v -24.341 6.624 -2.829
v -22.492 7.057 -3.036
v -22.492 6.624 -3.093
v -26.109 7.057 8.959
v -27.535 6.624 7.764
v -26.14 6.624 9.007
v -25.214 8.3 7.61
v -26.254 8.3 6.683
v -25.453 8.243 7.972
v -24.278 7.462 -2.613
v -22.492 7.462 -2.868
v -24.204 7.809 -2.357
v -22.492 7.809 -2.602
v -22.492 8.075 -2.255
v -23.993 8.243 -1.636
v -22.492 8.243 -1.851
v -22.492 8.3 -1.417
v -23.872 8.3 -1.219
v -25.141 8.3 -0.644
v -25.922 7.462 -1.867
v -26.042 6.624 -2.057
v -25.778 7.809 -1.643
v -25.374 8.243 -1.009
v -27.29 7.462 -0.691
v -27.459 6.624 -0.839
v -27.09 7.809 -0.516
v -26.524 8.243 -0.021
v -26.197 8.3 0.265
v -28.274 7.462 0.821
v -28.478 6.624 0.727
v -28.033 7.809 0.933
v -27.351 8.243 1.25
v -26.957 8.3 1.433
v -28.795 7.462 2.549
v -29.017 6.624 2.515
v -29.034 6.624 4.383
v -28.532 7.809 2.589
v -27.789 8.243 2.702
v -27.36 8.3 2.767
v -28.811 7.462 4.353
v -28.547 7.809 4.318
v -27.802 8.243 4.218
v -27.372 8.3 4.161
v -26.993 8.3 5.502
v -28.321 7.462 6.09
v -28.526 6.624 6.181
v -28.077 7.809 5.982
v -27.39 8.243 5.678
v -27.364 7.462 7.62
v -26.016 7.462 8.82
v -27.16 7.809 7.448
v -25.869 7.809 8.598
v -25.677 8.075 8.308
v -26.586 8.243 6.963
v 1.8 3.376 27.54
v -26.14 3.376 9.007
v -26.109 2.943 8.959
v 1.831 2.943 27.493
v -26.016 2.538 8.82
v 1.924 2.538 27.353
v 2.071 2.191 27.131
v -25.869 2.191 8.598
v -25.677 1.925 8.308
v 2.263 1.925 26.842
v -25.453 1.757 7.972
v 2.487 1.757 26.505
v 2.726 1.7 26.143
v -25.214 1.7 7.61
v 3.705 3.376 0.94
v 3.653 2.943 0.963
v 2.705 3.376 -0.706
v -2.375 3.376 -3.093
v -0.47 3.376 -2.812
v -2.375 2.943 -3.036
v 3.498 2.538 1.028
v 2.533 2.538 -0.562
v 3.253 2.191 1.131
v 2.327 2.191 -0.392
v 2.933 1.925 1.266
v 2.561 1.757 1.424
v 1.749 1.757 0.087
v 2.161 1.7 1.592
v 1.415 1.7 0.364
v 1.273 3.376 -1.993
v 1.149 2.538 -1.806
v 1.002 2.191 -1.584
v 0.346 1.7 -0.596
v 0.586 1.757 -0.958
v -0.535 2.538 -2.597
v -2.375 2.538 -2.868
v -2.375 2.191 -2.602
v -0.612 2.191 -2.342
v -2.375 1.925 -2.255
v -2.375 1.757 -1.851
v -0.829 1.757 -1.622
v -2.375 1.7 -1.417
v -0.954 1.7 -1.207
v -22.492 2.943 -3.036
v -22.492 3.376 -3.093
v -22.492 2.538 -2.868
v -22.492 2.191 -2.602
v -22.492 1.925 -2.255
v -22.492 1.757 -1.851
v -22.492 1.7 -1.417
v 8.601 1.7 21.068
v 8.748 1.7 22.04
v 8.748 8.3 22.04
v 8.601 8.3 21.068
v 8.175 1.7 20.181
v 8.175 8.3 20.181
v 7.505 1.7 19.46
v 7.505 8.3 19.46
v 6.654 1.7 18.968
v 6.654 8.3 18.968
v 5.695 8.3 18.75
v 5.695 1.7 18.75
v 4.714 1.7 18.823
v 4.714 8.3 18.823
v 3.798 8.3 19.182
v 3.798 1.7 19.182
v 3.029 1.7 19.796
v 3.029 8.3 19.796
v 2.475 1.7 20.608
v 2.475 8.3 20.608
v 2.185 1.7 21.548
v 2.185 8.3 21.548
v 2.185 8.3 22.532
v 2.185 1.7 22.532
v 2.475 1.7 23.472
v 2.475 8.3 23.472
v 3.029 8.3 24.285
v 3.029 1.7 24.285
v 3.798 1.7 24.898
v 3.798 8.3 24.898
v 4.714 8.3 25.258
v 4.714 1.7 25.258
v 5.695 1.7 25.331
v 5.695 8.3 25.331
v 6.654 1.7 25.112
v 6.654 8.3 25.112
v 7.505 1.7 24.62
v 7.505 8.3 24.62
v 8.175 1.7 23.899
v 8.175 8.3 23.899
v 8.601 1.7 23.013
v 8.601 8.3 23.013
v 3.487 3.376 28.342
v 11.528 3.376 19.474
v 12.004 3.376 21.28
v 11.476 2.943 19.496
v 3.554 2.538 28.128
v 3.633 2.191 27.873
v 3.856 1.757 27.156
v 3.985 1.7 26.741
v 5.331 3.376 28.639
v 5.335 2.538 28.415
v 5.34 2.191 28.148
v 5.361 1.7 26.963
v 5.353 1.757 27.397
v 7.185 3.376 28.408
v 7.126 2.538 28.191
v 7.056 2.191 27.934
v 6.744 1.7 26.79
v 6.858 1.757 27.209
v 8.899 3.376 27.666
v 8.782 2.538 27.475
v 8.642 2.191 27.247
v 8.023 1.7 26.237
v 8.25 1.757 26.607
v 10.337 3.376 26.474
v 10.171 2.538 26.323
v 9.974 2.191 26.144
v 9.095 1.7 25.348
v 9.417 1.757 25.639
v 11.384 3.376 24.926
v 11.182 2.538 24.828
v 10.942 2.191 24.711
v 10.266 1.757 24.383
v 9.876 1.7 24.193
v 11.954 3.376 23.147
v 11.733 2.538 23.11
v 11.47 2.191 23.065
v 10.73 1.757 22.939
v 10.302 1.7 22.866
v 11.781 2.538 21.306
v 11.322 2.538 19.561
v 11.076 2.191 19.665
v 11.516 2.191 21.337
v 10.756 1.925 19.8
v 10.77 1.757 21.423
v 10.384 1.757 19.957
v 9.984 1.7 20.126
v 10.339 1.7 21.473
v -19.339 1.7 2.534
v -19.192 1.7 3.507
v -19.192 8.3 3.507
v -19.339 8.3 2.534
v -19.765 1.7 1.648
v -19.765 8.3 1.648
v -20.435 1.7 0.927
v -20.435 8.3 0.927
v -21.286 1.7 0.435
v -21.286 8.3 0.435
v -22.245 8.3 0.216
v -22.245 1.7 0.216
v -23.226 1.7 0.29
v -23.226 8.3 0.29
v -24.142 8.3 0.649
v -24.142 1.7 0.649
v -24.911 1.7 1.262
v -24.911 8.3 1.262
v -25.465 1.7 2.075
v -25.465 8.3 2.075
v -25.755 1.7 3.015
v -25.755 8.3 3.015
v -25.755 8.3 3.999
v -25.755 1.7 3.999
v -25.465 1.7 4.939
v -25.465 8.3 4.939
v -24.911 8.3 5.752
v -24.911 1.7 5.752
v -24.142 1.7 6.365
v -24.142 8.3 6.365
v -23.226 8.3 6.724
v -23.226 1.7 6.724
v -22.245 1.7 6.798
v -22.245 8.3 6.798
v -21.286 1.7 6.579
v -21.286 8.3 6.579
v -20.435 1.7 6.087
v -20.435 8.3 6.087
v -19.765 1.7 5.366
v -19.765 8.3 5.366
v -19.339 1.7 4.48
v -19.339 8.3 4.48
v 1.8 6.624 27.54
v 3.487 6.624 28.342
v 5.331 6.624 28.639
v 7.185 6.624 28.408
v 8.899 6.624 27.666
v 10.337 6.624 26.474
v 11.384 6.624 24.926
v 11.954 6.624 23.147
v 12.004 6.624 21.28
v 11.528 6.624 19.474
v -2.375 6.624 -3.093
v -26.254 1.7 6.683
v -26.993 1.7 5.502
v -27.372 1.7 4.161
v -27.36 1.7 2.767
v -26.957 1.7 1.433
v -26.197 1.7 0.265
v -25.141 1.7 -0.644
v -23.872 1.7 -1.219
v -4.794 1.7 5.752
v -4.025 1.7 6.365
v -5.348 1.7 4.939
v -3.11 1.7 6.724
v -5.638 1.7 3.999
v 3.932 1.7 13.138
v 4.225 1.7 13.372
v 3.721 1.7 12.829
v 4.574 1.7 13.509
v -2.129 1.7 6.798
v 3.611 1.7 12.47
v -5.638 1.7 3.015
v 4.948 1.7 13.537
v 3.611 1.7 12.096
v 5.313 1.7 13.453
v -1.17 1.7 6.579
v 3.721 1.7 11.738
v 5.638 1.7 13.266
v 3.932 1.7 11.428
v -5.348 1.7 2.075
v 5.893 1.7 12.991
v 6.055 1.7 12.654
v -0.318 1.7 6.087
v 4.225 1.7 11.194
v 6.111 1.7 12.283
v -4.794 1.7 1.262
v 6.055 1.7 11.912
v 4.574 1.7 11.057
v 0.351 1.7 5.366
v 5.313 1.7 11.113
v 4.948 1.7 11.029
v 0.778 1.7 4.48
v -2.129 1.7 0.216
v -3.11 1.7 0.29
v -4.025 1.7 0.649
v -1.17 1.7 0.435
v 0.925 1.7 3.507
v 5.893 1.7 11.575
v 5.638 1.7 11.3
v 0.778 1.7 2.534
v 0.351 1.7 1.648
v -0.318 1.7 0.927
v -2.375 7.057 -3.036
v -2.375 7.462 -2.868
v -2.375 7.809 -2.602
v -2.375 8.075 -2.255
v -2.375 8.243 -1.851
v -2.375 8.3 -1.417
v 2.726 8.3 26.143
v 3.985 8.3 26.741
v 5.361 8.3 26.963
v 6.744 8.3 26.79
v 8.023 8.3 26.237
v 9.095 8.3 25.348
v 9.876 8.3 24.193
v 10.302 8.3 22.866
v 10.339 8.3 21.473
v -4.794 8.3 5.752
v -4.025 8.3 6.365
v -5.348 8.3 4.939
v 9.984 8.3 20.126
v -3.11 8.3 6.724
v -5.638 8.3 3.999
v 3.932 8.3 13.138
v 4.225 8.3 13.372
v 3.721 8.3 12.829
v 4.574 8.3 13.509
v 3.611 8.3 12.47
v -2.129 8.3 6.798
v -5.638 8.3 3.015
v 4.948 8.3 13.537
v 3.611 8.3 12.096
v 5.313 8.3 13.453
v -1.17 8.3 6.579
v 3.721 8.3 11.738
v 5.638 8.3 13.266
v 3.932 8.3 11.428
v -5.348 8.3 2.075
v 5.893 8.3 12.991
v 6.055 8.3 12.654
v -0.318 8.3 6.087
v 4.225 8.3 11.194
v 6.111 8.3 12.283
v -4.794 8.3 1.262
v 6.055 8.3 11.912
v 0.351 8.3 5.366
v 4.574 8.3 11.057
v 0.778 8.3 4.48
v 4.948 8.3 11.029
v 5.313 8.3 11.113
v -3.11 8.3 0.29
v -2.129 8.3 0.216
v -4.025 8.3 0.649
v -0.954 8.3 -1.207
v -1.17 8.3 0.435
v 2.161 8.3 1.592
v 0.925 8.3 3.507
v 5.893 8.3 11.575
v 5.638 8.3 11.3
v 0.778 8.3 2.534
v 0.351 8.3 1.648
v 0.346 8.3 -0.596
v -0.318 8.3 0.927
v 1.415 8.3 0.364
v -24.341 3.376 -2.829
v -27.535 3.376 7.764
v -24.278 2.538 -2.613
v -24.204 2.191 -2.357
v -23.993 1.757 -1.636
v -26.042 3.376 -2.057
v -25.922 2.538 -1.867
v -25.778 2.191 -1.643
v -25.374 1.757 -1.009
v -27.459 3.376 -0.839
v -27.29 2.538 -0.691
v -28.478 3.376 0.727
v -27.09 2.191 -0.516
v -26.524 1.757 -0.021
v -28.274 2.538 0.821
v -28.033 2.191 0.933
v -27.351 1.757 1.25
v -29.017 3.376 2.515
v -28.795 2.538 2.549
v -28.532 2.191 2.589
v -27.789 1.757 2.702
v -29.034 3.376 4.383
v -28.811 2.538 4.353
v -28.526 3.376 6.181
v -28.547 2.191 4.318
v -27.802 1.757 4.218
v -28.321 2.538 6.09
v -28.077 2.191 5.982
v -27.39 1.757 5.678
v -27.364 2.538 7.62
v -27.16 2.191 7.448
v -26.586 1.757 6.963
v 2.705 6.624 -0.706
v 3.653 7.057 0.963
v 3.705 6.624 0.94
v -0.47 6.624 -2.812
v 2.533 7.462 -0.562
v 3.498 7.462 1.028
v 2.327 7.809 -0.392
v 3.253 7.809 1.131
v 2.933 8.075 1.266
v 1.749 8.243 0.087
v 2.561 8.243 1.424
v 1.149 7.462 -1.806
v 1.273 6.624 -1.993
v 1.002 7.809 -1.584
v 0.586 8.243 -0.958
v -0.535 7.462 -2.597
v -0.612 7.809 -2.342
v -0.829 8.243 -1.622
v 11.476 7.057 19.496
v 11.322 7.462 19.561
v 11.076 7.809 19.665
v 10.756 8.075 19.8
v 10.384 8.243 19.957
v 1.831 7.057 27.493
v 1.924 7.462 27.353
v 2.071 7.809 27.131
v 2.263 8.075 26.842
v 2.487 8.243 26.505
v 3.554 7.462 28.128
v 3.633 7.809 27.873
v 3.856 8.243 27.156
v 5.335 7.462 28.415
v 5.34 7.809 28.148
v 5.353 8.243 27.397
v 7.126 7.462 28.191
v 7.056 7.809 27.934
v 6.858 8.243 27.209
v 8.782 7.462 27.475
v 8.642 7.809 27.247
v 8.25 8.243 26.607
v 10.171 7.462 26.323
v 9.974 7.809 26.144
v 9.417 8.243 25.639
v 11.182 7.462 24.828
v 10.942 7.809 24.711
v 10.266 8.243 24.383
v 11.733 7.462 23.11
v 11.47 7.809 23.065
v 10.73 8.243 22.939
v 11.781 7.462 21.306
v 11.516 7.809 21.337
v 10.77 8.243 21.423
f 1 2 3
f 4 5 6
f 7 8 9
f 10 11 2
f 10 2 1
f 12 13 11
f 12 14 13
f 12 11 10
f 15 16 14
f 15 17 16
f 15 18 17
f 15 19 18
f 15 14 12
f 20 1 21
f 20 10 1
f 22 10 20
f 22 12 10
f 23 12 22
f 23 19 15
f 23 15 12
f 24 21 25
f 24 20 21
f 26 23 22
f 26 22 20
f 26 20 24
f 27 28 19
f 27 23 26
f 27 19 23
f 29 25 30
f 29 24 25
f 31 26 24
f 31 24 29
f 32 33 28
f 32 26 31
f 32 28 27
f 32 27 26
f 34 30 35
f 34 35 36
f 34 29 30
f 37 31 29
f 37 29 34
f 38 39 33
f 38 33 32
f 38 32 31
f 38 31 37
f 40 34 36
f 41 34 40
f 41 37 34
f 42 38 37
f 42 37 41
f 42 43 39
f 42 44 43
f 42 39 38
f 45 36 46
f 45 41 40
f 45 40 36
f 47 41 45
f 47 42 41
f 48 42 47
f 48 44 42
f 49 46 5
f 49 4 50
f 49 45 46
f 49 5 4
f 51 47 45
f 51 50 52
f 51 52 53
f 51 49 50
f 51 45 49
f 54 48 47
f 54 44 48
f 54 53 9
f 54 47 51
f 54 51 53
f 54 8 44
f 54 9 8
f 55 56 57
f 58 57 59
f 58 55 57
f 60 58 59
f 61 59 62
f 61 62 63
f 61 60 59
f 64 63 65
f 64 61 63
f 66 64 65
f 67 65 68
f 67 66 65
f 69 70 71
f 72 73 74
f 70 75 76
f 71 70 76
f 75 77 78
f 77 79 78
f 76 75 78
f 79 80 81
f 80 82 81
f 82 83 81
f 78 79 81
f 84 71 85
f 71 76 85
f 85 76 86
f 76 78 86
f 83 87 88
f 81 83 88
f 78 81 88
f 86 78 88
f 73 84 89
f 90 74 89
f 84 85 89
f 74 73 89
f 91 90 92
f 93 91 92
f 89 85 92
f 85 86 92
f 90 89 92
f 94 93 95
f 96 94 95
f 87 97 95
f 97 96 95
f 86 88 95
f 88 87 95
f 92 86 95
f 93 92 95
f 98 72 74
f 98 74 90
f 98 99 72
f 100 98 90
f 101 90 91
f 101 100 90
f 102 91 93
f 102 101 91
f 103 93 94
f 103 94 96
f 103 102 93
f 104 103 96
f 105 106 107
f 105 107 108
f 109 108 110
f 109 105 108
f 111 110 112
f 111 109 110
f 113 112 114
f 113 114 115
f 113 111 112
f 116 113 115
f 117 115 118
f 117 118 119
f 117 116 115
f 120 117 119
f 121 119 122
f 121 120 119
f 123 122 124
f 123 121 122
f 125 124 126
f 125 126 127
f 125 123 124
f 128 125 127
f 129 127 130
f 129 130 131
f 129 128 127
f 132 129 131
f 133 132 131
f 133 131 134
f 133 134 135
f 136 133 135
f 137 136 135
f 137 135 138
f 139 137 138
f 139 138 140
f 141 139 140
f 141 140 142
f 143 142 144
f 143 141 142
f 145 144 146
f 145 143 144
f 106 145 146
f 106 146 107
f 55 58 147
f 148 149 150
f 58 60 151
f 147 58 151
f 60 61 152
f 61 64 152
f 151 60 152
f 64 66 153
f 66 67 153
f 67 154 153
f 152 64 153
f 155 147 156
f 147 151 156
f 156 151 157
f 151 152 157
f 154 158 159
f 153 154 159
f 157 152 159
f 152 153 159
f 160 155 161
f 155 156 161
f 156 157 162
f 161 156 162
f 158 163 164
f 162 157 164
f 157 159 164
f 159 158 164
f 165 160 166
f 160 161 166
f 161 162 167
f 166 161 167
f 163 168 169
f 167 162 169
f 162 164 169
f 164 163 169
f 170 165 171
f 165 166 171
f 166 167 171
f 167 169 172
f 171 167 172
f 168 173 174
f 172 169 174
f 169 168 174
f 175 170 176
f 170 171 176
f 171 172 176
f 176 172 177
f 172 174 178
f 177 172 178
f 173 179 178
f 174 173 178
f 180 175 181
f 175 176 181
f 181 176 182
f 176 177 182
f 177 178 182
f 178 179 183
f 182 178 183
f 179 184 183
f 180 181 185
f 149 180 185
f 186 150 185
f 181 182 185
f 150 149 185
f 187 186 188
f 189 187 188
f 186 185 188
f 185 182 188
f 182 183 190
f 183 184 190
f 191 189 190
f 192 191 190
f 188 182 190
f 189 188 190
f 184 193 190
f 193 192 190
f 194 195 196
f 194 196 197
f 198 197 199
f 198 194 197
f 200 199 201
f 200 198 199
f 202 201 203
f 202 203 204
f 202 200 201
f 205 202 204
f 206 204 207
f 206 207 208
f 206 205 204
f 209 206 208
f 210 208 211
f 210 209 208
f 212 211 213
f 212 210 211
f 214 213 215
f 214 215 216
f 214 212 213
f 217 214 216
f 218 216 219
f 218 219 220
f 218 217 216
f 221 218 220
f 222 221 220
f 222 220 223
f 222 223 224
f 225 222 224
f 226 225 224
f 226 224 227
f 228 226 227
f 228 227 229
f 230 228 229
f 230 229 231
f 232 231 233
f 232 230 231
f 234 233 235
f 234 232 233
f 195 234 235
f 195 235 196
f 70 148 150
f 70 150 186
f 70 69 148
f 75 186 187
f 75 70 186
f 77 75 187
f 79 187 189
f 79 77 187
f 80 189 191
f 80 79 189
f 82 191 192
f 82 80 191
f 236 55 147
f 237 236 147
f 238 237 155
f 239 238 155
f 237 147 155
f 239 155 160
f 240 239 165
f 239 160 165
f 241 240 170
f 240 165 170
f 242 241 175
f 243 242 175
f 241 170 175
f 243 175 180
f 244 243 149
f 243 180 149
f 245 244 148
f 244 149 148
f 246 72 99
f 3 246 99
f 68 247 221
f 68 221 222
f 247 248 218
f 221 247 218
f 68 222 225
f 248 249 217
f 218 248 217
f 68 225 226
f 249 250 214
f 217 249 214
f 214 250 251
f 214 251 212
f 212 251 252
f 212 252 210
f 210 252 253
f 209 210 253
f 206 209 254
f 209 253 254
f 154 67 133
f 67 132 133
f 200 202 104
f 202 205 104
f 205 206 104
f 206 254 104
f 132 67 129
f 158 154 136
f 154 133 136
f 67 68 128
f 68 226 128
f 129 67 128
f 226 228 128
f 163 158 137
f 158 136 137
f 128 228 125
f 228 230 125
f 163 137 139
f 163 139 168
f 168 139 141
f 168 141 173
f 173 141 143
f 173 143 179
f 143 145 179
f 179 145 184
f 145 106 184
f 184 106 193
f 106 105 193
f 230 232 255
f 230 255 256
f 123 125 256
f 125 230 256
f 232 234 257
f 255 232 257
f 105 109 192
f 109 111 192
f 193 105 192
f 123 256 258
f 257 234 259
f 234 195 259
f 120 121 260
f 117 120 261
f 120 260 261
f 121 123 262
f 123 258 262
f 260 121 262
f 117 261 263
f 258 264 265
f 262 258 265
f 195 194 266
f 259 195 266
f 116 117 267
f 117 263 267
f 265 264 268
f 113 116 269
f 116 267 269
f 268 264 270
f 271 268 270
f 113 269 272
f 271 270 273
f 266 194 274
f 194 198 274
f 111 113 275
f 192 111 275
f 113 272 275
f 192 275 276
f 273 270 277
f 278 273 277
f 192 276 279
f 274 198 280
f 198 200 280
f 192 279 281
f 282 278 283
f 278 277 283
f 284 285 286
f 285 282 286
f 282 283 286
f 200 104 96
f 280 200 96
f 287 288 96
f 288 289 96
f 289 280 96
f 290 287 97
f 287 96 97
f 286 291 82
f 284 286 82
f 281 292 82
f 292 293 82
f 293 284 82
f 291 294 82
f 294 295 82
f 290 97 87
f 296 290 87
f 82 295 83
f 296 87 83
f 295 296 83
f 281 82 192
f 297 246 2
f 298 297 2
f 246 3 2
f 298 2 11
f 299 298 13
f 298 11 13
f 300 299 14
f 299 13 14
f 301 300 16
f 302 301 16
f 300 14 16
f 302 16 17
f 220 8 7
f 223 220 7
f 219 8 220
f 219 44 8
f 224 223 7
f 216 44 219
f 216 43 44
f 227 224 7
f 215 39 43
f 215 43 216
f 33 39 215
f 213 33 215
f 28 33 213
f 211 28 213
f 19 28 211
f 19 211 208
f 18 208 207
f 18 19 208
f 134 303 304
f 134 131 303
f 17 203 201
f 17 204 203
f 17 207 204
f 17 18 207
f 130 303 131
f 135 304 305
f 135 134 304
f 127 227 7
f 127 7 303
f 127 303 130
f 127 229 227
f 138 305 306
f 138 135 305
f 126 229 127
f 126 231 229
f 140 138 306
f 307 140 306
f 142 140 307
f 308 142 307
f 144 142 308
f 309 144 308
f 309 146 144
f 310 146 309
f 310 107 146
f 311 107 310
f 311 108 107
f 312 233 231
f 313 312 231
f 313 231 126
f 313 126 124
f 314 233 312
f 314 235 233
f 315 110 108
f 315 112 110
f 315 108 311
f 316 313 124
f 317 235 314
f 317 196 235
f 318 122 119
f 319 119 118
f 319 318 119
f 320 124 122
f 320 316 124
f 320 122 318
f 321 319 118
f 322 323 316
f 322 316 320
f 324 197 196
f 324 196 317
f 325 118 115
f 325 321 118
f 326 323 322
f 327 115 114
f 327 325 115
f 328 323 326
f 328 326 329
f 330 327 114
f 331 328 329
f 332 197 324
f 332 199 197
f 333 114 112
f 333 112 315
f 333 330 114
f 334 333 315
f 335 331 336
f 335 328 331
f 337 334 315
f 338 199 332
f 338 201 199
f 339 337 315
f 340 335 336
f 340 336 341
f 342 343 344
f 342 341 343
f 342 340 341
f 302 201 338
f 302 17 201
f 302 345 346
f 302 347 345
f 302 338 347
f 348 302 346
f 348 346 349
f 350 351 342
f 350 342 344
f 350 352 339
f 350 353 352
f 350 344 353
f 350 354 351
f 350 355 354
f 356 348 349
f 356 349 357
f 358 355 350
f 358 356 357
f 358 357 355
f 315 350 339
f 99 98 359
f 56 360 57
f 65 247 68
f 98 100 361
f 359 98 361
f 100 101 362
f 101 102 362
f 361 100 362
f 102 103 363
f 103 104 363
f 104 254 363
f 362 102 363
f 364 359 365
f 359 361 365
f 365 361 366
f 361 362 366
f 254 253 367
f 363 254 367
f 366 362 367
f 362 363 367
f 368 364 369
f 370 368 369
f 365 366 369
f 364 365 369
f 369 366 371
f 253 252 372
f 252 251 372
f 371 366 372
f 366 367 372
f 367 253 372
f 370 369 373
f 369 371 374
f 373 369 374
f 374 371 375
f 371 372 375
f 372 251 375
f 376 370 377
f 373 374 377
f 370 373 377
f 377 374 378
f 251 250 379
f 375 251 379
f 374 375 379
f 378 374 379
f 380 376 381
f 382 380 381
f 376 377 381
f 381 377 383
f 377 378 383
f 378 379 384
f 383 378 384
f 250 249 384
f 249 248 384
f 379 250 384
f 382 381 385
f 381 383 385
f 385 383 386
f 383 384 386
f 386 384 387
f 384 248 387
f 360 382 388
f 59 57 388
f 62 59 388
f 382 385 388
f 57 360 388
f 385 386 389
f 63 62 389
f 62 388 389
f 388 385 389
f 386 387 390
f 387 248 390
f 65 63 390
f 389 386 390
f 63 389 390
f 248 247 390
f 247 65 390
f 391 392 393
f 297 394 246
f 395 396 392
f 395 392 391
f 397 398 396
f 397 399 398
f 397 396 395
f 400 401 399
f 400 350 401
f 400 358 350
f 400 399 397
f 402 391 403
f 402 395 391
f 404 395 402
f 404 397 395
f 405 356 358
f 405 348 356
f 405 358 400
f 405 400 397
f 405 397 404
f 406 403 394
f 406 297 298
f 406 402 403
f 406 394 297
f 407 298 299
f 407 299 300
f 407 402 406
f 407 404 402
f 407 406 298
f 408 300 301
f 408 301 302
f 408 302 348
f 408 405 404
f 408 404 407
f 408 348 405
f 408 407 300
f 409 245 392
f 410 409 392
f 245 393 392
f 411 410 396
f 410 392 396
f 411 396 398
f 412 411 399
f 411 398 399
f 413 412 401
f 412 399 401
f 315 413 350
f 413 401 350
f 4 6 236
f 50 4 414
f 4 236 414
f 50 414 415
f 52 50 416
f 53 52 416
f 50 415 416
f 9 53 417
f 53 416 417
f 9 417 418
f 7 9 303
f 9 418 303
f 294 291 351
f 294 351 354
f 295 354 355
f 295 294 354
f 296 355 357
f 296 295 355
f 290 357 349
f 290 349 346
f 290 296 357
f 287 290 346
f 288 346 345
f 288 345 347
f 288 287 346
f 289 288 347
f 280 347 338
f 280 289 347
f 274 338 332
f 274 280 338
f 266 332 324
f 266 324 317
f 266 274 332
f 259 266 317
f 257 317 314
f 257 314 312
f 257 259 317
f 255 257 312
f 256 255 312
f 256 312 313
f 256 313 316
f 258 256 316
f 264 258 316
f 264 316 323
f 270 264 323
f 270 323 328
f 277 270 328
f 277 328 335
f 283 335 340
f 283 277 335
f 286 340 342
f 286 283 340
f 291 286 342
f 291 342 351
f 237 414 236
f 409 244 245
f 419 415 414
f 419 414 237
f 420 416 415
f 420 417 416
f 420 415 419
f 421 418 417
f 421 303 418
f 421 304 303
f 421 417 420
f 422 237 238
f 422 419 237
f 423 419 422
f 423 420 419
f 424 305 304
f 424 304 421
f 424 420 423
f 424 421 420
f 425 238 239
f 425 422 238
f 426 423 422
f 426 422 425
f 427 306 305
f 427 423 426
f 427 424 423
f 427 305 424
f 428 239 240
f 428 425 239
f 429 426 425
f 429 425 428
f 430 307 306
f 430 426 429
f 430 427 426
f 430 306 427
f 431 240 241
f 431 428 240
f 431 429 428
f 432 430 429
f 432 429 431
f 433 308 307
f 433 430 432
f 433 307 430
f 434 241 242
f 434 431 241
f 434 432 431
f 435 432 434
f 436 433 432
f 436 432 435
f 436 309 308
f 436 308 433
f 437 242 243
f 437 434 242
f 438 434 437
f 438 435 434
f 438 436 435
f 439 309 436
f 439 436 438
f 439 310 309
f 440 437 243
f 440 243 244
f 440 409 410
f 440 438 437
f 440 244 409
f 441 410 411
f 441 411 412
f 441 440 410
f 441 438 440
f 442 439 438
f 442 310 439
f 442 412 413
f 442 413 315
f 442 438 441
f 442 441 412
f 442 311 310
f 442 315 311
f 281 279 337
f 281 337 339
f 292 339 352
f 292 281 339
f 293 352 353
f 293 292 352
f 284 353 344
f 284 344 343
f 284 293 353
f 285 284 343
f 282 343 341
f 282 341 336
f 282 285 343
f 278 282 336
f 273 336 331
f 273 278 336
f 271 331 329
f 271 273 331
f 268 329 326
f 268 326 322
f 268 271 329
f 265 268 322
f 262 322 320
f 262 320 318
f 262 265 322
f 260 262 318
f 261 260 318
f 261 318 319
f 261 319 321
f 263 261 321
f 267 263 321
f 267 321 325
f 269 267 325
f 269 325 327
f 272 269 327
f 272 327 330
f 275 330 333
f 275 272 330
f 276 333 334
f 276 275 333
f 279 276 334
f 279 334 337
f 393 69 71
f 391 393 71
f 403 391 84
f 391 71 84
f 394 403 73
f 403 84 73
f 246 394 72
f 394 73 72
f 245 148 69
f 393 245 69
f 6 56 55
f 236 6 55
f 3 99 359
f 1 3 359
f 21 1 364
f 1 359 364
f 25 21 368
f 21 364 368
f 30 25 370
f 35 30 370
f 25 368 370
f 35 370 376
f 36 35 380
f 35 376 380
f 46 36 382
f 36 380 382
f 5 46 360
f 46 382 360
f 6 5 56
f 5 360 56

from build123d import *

# Parameters (mm, degrees)
SKETCH1_R           = 5
SKETCH1_R_2         = 1.905
BOSS_EXTRUDE1_DEPTH = 10
FILLET1_R           = 2.54
SCALE1_SCALE        = 0.66


with BuildPart() as part:
    # Sketch1 → Boss-Extrude1 (new body)
    with BuildSketch(Plane(origin=(0, 0, 0), x_dir=(1, 0, 0), z_dir=(0, 1, 0))):
        with BuildLine():
            Line((-36.007707984, -8.333333333), (6.325625349, -36.414089892))
            ThreePointArc((6.325625349, -36.414089892), (18.236180718, -35.778760148), (21.066179973, -24.191867669))
            Line((21.066179973, -24.191867669), (9.21284664, 3.888888889))
            ThreePointArc((9.21284664, 3.888888889), (5.527707984, 8.333333333), (0, 10))
            Line((0, 10), (-30.48, 10))
            ThreePointArc((-30.48, 10), (-40.054271078, 2.886751346), (-36.007707984, -8.333333333))
        make_face()
        with Locations((-30.48, 0)):
            Circle(SKETCH1_R, mode=Mode.SUBTRACT)
        Circle(SKETCH1_R, mode=Mode.SUBTRACT)
        with Locations((11.853333333, -28.080756558)):
            Circle(SKETCH1_R, mode=Mode.SUBTRACT)
        with Locations((10.953276102, -13.297076469)):
            Circle(SKETCH1_R_2, mode=Mode.SUBTRACT)
    extrude(amount=BOSS_EXTRUDE1_DEPTH)

    # Fillet1
    fillet1_edges = [part.edges().sort_by_distance(p)[0] for p in [
        (18.236180718, 10, 35.778760148),
        (15.139513307, 10, 10.15148939),
        (5.527707984, 10, -8.333333333),
        (-15.24, 10, -10),
        (-40.054271078, 10, -2.886751346),
        (-15.24, 0, -10),
        (5.527707984, 0, -8.333333333),
        (15.139513307, 0, 10.15148939),
        (-14.841041317, 10, 22.373711613),
        (18.236180718, 0, 35.778760148),
        (-14.841041317, 0, 22.373711613),
        (-40.054271078, 0, -2.886751346),
    ]]
    fillet(fillet1_edges, radius=FILLET1_R)


with BuildPart() as part_1:
    # Scale1: scaled about (-6.985968974, 5, 10.314628386)
    add(part.part.scale(SCALE1_SCALE).moved(Location((-2.375229451, 1.7, 3.506973651))))


solid = part_1.part
